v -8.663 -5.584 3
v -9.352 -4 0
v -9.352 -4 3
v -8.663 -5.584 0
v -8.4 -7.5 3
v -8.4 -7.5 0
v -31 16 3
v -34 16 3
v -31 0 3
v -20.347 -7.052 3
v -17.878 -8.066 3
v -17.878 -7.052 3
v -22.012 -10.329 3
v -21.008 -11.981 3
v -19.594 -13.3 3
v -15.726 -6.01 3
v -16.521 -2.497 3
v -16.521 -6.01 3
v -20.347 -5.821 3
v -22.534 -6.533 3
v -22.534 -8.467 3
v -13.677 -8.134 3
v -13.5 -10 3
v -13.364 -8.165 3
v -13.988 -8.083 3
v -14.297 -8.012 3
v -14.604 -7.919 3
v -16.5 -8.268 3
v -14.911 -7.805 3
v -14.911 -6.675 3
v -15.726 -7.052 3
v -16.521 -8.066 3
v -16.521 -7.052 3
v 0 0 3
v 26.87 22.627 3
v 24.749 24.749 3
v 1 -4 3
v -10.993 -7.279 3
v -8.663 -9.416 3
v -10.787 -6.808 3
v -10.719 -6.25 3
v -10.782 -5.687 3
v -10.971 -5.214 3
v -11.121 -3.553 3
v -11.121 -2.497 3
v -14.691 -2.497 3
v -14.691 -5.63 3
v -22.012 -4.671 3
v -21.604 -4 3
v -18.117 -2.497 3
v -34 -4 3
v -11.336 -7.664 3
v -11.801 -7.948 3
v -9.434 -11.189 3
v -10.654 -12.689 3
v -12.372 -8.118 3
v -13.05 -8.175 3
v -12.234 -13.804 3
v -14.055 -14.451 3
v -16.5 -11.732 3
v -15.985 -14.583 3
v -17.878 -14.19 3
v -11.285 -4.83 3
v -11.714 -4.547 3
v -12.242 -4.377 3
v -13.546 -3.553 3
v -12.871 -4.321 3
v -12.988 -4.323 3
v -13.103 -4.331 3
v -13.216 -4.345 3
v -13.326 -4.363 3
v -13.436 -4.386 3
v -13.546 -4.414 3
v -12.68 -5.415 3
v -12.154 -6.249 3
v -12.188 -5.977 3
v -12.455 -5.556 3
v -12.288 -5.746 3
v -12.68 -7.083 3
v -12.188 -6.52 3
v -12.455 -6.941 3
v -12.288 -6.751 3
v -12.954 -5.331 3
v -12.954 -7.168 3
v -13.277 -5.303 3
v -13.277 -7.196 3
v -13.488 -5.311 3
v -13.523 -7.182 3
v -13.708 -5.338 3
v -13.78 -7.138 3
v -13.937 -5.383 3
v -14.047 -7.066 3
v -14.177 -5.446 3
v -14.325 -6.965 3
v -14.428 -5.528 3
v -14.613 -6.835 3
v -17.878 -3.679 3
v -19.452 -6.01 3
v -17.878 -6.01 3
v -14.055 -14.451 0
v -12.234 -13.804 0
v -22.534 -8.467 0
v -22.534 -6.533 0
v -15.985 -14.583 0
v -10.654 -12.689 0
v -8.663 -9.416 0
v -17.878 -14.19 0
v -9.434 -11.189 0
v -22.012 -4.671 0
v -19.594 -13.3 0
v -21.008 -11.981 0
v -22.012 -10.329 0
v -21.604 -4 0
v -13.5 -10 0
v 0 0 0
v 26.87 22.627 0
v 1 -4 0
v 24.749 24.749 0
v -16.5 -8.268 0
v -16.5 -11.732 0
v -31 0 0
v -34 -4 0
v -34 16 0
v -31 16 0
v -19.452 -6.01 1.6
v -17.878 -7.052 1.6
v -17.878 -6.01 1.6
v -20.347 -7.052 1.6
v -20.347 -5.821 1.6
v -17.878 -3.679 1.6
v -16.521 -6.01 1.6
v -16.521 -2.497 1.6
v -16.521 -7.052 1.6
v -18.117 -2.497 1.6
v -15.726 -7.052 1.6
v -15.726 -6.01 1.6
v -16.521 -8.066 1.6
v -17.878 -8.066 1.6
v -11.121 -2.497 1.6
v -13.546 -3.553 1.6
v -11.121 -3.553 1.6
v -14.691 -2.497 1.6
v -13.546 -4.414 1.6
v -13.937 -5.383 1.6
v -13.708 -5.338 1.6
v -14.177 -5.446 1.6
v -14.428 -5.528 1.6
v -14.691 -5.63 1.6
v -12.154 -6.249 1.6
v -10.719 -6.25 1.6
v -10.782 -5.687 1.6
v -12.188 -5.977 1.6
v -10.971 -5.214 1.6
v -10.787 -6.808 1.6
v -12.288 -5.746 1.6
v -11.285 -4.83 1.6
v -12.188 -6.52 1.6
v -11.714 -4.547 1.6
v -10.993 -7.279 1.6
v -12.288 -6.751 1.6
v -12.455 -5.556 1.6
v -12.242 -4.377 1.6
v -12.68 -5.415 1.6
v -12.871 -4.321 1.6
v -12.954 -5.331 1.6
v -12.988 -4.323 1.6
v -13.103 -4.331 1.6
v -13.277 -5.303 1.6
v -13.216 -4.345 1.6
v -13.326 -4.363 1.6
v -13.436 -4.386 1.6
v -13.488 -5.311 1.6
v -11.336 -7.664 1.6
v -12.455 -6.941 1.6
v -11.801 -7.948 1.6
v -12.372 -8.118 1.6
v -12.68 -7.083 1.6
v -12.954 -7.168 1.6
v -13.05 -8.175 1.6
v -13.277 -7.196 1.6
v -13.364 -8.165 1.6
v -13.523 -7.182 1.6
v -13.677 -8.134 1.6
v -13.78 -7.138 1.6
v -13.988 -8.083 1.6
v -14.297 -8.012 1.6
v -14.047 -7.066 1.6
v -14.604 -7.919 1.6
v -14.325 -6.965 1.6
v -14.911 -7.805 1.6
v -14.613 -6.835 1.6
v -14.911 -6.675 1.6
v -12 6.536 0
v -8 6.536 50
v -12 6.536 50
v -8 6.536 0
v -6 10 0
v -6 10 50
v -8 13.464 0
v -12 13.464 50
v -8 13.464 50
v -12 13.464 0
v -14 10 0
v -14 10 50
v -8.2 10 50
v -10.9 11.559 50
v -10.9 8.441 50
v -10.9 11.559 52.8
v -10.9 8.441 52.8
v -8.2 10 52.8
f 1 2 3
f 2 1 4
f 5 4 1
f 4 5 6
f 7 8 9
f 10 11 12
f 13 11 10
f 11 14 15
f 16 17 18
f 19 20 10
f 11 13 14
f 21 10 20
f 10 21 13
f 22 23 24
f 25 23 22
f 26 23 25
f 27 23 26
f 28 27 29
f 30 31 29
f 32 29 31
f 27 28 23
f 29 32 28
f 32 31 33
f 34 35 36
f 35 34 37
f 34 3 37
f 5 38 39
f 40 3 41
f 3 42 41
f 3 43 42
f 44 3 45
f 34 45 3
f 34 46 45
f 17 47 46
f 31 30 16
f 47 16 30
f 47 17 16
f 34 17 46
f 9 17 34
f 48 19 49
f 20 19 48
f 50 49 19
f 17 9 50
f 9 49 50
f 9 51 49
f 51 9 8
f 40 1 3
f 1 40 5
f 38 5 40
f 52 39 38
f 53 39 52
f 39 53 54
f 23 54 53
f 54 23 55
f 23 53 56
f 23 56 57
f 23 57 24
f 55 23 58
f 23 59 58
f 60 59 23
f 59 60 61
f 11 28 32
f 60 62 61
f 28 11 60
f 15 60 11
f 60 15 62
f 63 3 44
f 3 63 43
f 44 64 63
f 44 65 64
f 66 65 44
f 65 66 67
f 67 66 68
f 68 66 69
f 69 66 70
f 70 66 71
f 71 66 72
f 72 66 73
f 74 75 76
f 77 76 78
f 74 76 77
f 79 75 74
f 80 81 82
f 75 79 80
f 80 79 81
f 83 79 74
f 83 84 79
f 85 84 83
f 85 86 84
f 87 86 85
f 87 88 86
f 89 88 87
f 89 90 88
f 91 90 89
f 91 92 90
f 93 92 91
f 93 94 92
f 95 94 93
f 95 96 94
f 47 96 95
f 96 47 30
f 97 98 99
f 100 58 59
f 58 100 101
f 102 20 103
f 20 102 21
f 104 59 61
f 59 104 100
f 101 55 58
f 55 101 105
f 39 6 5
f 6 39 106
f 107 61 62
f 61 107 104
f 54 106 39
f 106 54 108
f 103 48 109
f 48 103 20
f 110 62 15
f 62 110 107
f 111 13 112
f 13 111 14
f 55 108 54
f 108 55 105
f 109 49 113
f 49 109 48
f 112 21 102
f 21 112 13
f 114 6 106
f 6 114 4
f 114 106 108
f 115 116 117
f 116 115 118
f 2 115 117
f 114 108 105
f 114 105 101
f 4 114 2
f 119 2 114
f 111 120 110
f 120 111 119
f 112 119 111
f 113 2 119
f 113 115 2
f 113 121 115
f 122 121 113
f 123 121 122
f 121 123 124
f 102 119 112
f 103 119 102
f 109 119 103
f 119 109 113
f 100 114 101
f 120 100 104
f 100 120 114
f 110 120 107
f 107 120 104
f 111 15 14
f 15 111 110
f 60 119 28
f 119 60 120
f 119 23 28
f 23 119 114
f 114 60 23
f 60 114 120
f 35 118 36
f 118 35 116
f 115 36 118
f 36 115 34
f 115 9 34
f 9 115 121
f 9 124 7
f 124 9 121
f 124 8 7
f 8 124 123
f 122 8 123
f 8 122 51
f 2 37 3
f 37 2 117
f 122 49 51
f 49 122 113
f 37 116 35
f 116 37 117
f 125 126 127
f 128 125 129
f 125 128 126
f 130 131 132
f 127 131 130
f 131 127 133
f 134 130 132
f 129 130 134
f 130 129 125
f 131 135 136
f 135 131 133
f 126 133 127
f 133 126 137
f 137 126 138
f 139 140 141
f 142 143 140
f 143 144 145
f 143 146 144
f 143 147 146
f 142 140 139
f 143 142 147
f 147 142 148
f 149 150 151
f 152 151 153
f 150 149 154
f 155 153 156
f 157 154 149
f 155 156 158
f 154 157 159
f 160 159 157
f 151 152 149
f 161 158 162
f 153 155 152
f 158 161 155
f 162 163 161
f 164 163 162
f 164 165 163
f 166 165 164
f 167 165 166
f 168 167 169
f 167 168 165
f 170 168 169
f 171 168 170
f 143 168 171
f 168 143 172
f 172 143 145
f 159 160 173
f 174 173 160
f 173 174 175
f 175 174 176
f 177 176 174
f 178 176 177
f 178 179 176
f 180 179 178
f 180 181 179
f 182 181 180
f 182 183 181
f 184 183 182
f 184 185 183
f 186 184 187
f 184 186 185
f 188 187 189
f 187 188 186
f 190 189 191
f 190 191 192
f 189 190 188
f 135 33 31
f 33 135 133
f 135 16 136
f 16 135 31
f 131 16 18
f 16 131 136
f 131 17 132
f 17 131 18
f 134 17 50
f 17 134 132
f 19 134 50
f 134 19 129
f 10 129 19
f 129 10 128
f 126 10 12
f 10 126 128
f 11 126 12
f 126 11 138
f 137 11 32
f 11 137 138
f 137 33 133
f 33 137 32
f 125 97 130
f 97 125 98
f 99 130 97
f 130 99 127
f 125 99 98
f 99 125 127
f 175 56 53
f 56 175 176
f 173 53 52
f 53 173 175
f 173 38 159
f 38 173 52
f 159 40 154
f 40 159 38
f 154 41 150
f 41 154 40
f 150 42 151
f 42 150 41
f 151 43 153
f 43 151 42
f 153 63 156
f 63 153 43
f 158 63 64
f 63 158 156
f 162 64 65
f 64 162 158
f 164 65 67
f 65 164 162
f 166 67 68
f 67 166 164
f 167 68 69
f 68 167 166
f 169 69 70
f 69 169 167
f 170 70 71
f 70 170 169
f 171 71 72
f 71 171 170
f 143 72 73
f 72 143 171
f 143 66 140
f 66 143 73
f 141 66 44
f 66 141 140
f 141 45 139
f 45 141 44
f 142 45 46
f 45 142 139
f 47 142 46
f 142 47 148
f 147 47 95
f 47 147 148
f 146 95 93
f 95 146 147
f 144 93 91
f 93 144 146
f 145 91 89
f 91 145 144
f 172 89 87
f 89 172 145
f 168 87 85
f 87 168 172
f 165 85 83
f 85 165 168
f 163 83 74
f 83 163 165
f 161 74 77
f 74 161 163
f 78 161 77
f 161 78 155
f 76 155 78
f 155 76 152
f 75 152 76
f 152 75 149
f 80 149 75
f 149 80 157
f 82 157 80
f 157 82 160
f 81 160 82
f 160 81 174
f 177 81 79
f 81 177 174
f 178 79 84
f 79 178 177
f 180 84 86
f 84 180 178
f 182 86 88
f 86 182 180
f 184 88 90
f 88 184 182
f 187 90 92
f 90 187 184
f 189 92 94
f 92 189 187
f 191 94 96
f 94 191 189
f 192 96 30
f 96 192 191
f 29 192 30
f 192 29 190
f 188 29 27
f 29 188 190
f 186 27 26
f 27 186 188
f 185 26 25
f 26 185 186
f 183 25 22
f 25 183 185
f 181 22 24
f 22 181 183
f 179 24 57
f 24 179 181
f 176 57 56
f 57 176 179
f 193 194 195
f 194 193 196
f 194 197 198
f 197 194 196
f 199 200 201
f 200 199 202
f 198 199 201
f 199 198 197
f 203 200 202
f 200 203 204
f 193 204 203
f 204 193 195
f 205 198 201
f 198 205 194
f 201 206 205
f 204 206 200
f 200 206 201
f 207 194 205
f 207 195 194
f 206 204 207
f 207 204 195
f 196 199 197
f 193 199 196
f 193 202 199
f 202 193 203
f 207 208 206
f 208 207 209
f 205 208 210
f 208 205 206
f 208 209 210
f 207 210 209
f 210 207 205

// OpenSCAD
// Armada 30 degree turn template Reversible

turnAngle = 45.00 ;

baseWidth=31.00 ; height=3.00 ;
armLength = 35.00;
armWidth = 3.00 ;
baseDepth = 5.00 ;
yOffset = -4.0 ; sideHeight = 20.0 ;

module turnMeasure(turnAngle) {
newPoints = [
    [-baseWidth-armWidth,yOffset], [-baseWidth-armWidth,sideHeight+yOffset], [-baseWidth,sideHeight+yOffset], [-baseWidth,0], [0, 0],
    [armLength*sin(turnAngle), armLength*cos(turnAngle)], 
    [armLength*sin(turnAngle)+armWidth*cos(turnAngle), armLength*cos(turnAngle)-armWidth*sin(turnAngle)],
    [1,yOffset]
] ;

difference() 
    {
     union() 
     {
         linear_extrude(height=height) polygon(newPoints);
         //translate([baseWidth,0,0])mirror([1,0,0])linear_extrude(height=height) polygon(points);
         // add finger tab
        difference() { 
        translate([-baseWidth/2,-7.5,0]) color("orange") cylinder(r=7.1,h=height) ;
        translate([-baseWidth/2,-10,-.01]) cylinder(r=2,h=height+2, $fn=3) ;
        }
     }

     //translate([-baseWidth/2,-baseDepth/2-1,1.6])
         //linear_extrude(height=2.0)
            //text("Yellow", font="Arial Rounded MT Bold:style=Bold",size=4, valign="center", halign="center");

     translate([-baseWidth/2,-5.4,1.6])
         linear_extrude(height=1.6)
            text(str(turnAngle), size=5.5, font="Arial Rounded MT Bold:style=Bold", valign="center", halign="center");
            
}
}

module holder () {

    cylinder(r=4, h=50, $fn=6) ;
    translate([0,0,49.8]) cylinder(r=1.8,h=height, $fn=3) ;
}

turnMeasure(turnAngle) ;

translate([-10,10,0]) holder() ;
